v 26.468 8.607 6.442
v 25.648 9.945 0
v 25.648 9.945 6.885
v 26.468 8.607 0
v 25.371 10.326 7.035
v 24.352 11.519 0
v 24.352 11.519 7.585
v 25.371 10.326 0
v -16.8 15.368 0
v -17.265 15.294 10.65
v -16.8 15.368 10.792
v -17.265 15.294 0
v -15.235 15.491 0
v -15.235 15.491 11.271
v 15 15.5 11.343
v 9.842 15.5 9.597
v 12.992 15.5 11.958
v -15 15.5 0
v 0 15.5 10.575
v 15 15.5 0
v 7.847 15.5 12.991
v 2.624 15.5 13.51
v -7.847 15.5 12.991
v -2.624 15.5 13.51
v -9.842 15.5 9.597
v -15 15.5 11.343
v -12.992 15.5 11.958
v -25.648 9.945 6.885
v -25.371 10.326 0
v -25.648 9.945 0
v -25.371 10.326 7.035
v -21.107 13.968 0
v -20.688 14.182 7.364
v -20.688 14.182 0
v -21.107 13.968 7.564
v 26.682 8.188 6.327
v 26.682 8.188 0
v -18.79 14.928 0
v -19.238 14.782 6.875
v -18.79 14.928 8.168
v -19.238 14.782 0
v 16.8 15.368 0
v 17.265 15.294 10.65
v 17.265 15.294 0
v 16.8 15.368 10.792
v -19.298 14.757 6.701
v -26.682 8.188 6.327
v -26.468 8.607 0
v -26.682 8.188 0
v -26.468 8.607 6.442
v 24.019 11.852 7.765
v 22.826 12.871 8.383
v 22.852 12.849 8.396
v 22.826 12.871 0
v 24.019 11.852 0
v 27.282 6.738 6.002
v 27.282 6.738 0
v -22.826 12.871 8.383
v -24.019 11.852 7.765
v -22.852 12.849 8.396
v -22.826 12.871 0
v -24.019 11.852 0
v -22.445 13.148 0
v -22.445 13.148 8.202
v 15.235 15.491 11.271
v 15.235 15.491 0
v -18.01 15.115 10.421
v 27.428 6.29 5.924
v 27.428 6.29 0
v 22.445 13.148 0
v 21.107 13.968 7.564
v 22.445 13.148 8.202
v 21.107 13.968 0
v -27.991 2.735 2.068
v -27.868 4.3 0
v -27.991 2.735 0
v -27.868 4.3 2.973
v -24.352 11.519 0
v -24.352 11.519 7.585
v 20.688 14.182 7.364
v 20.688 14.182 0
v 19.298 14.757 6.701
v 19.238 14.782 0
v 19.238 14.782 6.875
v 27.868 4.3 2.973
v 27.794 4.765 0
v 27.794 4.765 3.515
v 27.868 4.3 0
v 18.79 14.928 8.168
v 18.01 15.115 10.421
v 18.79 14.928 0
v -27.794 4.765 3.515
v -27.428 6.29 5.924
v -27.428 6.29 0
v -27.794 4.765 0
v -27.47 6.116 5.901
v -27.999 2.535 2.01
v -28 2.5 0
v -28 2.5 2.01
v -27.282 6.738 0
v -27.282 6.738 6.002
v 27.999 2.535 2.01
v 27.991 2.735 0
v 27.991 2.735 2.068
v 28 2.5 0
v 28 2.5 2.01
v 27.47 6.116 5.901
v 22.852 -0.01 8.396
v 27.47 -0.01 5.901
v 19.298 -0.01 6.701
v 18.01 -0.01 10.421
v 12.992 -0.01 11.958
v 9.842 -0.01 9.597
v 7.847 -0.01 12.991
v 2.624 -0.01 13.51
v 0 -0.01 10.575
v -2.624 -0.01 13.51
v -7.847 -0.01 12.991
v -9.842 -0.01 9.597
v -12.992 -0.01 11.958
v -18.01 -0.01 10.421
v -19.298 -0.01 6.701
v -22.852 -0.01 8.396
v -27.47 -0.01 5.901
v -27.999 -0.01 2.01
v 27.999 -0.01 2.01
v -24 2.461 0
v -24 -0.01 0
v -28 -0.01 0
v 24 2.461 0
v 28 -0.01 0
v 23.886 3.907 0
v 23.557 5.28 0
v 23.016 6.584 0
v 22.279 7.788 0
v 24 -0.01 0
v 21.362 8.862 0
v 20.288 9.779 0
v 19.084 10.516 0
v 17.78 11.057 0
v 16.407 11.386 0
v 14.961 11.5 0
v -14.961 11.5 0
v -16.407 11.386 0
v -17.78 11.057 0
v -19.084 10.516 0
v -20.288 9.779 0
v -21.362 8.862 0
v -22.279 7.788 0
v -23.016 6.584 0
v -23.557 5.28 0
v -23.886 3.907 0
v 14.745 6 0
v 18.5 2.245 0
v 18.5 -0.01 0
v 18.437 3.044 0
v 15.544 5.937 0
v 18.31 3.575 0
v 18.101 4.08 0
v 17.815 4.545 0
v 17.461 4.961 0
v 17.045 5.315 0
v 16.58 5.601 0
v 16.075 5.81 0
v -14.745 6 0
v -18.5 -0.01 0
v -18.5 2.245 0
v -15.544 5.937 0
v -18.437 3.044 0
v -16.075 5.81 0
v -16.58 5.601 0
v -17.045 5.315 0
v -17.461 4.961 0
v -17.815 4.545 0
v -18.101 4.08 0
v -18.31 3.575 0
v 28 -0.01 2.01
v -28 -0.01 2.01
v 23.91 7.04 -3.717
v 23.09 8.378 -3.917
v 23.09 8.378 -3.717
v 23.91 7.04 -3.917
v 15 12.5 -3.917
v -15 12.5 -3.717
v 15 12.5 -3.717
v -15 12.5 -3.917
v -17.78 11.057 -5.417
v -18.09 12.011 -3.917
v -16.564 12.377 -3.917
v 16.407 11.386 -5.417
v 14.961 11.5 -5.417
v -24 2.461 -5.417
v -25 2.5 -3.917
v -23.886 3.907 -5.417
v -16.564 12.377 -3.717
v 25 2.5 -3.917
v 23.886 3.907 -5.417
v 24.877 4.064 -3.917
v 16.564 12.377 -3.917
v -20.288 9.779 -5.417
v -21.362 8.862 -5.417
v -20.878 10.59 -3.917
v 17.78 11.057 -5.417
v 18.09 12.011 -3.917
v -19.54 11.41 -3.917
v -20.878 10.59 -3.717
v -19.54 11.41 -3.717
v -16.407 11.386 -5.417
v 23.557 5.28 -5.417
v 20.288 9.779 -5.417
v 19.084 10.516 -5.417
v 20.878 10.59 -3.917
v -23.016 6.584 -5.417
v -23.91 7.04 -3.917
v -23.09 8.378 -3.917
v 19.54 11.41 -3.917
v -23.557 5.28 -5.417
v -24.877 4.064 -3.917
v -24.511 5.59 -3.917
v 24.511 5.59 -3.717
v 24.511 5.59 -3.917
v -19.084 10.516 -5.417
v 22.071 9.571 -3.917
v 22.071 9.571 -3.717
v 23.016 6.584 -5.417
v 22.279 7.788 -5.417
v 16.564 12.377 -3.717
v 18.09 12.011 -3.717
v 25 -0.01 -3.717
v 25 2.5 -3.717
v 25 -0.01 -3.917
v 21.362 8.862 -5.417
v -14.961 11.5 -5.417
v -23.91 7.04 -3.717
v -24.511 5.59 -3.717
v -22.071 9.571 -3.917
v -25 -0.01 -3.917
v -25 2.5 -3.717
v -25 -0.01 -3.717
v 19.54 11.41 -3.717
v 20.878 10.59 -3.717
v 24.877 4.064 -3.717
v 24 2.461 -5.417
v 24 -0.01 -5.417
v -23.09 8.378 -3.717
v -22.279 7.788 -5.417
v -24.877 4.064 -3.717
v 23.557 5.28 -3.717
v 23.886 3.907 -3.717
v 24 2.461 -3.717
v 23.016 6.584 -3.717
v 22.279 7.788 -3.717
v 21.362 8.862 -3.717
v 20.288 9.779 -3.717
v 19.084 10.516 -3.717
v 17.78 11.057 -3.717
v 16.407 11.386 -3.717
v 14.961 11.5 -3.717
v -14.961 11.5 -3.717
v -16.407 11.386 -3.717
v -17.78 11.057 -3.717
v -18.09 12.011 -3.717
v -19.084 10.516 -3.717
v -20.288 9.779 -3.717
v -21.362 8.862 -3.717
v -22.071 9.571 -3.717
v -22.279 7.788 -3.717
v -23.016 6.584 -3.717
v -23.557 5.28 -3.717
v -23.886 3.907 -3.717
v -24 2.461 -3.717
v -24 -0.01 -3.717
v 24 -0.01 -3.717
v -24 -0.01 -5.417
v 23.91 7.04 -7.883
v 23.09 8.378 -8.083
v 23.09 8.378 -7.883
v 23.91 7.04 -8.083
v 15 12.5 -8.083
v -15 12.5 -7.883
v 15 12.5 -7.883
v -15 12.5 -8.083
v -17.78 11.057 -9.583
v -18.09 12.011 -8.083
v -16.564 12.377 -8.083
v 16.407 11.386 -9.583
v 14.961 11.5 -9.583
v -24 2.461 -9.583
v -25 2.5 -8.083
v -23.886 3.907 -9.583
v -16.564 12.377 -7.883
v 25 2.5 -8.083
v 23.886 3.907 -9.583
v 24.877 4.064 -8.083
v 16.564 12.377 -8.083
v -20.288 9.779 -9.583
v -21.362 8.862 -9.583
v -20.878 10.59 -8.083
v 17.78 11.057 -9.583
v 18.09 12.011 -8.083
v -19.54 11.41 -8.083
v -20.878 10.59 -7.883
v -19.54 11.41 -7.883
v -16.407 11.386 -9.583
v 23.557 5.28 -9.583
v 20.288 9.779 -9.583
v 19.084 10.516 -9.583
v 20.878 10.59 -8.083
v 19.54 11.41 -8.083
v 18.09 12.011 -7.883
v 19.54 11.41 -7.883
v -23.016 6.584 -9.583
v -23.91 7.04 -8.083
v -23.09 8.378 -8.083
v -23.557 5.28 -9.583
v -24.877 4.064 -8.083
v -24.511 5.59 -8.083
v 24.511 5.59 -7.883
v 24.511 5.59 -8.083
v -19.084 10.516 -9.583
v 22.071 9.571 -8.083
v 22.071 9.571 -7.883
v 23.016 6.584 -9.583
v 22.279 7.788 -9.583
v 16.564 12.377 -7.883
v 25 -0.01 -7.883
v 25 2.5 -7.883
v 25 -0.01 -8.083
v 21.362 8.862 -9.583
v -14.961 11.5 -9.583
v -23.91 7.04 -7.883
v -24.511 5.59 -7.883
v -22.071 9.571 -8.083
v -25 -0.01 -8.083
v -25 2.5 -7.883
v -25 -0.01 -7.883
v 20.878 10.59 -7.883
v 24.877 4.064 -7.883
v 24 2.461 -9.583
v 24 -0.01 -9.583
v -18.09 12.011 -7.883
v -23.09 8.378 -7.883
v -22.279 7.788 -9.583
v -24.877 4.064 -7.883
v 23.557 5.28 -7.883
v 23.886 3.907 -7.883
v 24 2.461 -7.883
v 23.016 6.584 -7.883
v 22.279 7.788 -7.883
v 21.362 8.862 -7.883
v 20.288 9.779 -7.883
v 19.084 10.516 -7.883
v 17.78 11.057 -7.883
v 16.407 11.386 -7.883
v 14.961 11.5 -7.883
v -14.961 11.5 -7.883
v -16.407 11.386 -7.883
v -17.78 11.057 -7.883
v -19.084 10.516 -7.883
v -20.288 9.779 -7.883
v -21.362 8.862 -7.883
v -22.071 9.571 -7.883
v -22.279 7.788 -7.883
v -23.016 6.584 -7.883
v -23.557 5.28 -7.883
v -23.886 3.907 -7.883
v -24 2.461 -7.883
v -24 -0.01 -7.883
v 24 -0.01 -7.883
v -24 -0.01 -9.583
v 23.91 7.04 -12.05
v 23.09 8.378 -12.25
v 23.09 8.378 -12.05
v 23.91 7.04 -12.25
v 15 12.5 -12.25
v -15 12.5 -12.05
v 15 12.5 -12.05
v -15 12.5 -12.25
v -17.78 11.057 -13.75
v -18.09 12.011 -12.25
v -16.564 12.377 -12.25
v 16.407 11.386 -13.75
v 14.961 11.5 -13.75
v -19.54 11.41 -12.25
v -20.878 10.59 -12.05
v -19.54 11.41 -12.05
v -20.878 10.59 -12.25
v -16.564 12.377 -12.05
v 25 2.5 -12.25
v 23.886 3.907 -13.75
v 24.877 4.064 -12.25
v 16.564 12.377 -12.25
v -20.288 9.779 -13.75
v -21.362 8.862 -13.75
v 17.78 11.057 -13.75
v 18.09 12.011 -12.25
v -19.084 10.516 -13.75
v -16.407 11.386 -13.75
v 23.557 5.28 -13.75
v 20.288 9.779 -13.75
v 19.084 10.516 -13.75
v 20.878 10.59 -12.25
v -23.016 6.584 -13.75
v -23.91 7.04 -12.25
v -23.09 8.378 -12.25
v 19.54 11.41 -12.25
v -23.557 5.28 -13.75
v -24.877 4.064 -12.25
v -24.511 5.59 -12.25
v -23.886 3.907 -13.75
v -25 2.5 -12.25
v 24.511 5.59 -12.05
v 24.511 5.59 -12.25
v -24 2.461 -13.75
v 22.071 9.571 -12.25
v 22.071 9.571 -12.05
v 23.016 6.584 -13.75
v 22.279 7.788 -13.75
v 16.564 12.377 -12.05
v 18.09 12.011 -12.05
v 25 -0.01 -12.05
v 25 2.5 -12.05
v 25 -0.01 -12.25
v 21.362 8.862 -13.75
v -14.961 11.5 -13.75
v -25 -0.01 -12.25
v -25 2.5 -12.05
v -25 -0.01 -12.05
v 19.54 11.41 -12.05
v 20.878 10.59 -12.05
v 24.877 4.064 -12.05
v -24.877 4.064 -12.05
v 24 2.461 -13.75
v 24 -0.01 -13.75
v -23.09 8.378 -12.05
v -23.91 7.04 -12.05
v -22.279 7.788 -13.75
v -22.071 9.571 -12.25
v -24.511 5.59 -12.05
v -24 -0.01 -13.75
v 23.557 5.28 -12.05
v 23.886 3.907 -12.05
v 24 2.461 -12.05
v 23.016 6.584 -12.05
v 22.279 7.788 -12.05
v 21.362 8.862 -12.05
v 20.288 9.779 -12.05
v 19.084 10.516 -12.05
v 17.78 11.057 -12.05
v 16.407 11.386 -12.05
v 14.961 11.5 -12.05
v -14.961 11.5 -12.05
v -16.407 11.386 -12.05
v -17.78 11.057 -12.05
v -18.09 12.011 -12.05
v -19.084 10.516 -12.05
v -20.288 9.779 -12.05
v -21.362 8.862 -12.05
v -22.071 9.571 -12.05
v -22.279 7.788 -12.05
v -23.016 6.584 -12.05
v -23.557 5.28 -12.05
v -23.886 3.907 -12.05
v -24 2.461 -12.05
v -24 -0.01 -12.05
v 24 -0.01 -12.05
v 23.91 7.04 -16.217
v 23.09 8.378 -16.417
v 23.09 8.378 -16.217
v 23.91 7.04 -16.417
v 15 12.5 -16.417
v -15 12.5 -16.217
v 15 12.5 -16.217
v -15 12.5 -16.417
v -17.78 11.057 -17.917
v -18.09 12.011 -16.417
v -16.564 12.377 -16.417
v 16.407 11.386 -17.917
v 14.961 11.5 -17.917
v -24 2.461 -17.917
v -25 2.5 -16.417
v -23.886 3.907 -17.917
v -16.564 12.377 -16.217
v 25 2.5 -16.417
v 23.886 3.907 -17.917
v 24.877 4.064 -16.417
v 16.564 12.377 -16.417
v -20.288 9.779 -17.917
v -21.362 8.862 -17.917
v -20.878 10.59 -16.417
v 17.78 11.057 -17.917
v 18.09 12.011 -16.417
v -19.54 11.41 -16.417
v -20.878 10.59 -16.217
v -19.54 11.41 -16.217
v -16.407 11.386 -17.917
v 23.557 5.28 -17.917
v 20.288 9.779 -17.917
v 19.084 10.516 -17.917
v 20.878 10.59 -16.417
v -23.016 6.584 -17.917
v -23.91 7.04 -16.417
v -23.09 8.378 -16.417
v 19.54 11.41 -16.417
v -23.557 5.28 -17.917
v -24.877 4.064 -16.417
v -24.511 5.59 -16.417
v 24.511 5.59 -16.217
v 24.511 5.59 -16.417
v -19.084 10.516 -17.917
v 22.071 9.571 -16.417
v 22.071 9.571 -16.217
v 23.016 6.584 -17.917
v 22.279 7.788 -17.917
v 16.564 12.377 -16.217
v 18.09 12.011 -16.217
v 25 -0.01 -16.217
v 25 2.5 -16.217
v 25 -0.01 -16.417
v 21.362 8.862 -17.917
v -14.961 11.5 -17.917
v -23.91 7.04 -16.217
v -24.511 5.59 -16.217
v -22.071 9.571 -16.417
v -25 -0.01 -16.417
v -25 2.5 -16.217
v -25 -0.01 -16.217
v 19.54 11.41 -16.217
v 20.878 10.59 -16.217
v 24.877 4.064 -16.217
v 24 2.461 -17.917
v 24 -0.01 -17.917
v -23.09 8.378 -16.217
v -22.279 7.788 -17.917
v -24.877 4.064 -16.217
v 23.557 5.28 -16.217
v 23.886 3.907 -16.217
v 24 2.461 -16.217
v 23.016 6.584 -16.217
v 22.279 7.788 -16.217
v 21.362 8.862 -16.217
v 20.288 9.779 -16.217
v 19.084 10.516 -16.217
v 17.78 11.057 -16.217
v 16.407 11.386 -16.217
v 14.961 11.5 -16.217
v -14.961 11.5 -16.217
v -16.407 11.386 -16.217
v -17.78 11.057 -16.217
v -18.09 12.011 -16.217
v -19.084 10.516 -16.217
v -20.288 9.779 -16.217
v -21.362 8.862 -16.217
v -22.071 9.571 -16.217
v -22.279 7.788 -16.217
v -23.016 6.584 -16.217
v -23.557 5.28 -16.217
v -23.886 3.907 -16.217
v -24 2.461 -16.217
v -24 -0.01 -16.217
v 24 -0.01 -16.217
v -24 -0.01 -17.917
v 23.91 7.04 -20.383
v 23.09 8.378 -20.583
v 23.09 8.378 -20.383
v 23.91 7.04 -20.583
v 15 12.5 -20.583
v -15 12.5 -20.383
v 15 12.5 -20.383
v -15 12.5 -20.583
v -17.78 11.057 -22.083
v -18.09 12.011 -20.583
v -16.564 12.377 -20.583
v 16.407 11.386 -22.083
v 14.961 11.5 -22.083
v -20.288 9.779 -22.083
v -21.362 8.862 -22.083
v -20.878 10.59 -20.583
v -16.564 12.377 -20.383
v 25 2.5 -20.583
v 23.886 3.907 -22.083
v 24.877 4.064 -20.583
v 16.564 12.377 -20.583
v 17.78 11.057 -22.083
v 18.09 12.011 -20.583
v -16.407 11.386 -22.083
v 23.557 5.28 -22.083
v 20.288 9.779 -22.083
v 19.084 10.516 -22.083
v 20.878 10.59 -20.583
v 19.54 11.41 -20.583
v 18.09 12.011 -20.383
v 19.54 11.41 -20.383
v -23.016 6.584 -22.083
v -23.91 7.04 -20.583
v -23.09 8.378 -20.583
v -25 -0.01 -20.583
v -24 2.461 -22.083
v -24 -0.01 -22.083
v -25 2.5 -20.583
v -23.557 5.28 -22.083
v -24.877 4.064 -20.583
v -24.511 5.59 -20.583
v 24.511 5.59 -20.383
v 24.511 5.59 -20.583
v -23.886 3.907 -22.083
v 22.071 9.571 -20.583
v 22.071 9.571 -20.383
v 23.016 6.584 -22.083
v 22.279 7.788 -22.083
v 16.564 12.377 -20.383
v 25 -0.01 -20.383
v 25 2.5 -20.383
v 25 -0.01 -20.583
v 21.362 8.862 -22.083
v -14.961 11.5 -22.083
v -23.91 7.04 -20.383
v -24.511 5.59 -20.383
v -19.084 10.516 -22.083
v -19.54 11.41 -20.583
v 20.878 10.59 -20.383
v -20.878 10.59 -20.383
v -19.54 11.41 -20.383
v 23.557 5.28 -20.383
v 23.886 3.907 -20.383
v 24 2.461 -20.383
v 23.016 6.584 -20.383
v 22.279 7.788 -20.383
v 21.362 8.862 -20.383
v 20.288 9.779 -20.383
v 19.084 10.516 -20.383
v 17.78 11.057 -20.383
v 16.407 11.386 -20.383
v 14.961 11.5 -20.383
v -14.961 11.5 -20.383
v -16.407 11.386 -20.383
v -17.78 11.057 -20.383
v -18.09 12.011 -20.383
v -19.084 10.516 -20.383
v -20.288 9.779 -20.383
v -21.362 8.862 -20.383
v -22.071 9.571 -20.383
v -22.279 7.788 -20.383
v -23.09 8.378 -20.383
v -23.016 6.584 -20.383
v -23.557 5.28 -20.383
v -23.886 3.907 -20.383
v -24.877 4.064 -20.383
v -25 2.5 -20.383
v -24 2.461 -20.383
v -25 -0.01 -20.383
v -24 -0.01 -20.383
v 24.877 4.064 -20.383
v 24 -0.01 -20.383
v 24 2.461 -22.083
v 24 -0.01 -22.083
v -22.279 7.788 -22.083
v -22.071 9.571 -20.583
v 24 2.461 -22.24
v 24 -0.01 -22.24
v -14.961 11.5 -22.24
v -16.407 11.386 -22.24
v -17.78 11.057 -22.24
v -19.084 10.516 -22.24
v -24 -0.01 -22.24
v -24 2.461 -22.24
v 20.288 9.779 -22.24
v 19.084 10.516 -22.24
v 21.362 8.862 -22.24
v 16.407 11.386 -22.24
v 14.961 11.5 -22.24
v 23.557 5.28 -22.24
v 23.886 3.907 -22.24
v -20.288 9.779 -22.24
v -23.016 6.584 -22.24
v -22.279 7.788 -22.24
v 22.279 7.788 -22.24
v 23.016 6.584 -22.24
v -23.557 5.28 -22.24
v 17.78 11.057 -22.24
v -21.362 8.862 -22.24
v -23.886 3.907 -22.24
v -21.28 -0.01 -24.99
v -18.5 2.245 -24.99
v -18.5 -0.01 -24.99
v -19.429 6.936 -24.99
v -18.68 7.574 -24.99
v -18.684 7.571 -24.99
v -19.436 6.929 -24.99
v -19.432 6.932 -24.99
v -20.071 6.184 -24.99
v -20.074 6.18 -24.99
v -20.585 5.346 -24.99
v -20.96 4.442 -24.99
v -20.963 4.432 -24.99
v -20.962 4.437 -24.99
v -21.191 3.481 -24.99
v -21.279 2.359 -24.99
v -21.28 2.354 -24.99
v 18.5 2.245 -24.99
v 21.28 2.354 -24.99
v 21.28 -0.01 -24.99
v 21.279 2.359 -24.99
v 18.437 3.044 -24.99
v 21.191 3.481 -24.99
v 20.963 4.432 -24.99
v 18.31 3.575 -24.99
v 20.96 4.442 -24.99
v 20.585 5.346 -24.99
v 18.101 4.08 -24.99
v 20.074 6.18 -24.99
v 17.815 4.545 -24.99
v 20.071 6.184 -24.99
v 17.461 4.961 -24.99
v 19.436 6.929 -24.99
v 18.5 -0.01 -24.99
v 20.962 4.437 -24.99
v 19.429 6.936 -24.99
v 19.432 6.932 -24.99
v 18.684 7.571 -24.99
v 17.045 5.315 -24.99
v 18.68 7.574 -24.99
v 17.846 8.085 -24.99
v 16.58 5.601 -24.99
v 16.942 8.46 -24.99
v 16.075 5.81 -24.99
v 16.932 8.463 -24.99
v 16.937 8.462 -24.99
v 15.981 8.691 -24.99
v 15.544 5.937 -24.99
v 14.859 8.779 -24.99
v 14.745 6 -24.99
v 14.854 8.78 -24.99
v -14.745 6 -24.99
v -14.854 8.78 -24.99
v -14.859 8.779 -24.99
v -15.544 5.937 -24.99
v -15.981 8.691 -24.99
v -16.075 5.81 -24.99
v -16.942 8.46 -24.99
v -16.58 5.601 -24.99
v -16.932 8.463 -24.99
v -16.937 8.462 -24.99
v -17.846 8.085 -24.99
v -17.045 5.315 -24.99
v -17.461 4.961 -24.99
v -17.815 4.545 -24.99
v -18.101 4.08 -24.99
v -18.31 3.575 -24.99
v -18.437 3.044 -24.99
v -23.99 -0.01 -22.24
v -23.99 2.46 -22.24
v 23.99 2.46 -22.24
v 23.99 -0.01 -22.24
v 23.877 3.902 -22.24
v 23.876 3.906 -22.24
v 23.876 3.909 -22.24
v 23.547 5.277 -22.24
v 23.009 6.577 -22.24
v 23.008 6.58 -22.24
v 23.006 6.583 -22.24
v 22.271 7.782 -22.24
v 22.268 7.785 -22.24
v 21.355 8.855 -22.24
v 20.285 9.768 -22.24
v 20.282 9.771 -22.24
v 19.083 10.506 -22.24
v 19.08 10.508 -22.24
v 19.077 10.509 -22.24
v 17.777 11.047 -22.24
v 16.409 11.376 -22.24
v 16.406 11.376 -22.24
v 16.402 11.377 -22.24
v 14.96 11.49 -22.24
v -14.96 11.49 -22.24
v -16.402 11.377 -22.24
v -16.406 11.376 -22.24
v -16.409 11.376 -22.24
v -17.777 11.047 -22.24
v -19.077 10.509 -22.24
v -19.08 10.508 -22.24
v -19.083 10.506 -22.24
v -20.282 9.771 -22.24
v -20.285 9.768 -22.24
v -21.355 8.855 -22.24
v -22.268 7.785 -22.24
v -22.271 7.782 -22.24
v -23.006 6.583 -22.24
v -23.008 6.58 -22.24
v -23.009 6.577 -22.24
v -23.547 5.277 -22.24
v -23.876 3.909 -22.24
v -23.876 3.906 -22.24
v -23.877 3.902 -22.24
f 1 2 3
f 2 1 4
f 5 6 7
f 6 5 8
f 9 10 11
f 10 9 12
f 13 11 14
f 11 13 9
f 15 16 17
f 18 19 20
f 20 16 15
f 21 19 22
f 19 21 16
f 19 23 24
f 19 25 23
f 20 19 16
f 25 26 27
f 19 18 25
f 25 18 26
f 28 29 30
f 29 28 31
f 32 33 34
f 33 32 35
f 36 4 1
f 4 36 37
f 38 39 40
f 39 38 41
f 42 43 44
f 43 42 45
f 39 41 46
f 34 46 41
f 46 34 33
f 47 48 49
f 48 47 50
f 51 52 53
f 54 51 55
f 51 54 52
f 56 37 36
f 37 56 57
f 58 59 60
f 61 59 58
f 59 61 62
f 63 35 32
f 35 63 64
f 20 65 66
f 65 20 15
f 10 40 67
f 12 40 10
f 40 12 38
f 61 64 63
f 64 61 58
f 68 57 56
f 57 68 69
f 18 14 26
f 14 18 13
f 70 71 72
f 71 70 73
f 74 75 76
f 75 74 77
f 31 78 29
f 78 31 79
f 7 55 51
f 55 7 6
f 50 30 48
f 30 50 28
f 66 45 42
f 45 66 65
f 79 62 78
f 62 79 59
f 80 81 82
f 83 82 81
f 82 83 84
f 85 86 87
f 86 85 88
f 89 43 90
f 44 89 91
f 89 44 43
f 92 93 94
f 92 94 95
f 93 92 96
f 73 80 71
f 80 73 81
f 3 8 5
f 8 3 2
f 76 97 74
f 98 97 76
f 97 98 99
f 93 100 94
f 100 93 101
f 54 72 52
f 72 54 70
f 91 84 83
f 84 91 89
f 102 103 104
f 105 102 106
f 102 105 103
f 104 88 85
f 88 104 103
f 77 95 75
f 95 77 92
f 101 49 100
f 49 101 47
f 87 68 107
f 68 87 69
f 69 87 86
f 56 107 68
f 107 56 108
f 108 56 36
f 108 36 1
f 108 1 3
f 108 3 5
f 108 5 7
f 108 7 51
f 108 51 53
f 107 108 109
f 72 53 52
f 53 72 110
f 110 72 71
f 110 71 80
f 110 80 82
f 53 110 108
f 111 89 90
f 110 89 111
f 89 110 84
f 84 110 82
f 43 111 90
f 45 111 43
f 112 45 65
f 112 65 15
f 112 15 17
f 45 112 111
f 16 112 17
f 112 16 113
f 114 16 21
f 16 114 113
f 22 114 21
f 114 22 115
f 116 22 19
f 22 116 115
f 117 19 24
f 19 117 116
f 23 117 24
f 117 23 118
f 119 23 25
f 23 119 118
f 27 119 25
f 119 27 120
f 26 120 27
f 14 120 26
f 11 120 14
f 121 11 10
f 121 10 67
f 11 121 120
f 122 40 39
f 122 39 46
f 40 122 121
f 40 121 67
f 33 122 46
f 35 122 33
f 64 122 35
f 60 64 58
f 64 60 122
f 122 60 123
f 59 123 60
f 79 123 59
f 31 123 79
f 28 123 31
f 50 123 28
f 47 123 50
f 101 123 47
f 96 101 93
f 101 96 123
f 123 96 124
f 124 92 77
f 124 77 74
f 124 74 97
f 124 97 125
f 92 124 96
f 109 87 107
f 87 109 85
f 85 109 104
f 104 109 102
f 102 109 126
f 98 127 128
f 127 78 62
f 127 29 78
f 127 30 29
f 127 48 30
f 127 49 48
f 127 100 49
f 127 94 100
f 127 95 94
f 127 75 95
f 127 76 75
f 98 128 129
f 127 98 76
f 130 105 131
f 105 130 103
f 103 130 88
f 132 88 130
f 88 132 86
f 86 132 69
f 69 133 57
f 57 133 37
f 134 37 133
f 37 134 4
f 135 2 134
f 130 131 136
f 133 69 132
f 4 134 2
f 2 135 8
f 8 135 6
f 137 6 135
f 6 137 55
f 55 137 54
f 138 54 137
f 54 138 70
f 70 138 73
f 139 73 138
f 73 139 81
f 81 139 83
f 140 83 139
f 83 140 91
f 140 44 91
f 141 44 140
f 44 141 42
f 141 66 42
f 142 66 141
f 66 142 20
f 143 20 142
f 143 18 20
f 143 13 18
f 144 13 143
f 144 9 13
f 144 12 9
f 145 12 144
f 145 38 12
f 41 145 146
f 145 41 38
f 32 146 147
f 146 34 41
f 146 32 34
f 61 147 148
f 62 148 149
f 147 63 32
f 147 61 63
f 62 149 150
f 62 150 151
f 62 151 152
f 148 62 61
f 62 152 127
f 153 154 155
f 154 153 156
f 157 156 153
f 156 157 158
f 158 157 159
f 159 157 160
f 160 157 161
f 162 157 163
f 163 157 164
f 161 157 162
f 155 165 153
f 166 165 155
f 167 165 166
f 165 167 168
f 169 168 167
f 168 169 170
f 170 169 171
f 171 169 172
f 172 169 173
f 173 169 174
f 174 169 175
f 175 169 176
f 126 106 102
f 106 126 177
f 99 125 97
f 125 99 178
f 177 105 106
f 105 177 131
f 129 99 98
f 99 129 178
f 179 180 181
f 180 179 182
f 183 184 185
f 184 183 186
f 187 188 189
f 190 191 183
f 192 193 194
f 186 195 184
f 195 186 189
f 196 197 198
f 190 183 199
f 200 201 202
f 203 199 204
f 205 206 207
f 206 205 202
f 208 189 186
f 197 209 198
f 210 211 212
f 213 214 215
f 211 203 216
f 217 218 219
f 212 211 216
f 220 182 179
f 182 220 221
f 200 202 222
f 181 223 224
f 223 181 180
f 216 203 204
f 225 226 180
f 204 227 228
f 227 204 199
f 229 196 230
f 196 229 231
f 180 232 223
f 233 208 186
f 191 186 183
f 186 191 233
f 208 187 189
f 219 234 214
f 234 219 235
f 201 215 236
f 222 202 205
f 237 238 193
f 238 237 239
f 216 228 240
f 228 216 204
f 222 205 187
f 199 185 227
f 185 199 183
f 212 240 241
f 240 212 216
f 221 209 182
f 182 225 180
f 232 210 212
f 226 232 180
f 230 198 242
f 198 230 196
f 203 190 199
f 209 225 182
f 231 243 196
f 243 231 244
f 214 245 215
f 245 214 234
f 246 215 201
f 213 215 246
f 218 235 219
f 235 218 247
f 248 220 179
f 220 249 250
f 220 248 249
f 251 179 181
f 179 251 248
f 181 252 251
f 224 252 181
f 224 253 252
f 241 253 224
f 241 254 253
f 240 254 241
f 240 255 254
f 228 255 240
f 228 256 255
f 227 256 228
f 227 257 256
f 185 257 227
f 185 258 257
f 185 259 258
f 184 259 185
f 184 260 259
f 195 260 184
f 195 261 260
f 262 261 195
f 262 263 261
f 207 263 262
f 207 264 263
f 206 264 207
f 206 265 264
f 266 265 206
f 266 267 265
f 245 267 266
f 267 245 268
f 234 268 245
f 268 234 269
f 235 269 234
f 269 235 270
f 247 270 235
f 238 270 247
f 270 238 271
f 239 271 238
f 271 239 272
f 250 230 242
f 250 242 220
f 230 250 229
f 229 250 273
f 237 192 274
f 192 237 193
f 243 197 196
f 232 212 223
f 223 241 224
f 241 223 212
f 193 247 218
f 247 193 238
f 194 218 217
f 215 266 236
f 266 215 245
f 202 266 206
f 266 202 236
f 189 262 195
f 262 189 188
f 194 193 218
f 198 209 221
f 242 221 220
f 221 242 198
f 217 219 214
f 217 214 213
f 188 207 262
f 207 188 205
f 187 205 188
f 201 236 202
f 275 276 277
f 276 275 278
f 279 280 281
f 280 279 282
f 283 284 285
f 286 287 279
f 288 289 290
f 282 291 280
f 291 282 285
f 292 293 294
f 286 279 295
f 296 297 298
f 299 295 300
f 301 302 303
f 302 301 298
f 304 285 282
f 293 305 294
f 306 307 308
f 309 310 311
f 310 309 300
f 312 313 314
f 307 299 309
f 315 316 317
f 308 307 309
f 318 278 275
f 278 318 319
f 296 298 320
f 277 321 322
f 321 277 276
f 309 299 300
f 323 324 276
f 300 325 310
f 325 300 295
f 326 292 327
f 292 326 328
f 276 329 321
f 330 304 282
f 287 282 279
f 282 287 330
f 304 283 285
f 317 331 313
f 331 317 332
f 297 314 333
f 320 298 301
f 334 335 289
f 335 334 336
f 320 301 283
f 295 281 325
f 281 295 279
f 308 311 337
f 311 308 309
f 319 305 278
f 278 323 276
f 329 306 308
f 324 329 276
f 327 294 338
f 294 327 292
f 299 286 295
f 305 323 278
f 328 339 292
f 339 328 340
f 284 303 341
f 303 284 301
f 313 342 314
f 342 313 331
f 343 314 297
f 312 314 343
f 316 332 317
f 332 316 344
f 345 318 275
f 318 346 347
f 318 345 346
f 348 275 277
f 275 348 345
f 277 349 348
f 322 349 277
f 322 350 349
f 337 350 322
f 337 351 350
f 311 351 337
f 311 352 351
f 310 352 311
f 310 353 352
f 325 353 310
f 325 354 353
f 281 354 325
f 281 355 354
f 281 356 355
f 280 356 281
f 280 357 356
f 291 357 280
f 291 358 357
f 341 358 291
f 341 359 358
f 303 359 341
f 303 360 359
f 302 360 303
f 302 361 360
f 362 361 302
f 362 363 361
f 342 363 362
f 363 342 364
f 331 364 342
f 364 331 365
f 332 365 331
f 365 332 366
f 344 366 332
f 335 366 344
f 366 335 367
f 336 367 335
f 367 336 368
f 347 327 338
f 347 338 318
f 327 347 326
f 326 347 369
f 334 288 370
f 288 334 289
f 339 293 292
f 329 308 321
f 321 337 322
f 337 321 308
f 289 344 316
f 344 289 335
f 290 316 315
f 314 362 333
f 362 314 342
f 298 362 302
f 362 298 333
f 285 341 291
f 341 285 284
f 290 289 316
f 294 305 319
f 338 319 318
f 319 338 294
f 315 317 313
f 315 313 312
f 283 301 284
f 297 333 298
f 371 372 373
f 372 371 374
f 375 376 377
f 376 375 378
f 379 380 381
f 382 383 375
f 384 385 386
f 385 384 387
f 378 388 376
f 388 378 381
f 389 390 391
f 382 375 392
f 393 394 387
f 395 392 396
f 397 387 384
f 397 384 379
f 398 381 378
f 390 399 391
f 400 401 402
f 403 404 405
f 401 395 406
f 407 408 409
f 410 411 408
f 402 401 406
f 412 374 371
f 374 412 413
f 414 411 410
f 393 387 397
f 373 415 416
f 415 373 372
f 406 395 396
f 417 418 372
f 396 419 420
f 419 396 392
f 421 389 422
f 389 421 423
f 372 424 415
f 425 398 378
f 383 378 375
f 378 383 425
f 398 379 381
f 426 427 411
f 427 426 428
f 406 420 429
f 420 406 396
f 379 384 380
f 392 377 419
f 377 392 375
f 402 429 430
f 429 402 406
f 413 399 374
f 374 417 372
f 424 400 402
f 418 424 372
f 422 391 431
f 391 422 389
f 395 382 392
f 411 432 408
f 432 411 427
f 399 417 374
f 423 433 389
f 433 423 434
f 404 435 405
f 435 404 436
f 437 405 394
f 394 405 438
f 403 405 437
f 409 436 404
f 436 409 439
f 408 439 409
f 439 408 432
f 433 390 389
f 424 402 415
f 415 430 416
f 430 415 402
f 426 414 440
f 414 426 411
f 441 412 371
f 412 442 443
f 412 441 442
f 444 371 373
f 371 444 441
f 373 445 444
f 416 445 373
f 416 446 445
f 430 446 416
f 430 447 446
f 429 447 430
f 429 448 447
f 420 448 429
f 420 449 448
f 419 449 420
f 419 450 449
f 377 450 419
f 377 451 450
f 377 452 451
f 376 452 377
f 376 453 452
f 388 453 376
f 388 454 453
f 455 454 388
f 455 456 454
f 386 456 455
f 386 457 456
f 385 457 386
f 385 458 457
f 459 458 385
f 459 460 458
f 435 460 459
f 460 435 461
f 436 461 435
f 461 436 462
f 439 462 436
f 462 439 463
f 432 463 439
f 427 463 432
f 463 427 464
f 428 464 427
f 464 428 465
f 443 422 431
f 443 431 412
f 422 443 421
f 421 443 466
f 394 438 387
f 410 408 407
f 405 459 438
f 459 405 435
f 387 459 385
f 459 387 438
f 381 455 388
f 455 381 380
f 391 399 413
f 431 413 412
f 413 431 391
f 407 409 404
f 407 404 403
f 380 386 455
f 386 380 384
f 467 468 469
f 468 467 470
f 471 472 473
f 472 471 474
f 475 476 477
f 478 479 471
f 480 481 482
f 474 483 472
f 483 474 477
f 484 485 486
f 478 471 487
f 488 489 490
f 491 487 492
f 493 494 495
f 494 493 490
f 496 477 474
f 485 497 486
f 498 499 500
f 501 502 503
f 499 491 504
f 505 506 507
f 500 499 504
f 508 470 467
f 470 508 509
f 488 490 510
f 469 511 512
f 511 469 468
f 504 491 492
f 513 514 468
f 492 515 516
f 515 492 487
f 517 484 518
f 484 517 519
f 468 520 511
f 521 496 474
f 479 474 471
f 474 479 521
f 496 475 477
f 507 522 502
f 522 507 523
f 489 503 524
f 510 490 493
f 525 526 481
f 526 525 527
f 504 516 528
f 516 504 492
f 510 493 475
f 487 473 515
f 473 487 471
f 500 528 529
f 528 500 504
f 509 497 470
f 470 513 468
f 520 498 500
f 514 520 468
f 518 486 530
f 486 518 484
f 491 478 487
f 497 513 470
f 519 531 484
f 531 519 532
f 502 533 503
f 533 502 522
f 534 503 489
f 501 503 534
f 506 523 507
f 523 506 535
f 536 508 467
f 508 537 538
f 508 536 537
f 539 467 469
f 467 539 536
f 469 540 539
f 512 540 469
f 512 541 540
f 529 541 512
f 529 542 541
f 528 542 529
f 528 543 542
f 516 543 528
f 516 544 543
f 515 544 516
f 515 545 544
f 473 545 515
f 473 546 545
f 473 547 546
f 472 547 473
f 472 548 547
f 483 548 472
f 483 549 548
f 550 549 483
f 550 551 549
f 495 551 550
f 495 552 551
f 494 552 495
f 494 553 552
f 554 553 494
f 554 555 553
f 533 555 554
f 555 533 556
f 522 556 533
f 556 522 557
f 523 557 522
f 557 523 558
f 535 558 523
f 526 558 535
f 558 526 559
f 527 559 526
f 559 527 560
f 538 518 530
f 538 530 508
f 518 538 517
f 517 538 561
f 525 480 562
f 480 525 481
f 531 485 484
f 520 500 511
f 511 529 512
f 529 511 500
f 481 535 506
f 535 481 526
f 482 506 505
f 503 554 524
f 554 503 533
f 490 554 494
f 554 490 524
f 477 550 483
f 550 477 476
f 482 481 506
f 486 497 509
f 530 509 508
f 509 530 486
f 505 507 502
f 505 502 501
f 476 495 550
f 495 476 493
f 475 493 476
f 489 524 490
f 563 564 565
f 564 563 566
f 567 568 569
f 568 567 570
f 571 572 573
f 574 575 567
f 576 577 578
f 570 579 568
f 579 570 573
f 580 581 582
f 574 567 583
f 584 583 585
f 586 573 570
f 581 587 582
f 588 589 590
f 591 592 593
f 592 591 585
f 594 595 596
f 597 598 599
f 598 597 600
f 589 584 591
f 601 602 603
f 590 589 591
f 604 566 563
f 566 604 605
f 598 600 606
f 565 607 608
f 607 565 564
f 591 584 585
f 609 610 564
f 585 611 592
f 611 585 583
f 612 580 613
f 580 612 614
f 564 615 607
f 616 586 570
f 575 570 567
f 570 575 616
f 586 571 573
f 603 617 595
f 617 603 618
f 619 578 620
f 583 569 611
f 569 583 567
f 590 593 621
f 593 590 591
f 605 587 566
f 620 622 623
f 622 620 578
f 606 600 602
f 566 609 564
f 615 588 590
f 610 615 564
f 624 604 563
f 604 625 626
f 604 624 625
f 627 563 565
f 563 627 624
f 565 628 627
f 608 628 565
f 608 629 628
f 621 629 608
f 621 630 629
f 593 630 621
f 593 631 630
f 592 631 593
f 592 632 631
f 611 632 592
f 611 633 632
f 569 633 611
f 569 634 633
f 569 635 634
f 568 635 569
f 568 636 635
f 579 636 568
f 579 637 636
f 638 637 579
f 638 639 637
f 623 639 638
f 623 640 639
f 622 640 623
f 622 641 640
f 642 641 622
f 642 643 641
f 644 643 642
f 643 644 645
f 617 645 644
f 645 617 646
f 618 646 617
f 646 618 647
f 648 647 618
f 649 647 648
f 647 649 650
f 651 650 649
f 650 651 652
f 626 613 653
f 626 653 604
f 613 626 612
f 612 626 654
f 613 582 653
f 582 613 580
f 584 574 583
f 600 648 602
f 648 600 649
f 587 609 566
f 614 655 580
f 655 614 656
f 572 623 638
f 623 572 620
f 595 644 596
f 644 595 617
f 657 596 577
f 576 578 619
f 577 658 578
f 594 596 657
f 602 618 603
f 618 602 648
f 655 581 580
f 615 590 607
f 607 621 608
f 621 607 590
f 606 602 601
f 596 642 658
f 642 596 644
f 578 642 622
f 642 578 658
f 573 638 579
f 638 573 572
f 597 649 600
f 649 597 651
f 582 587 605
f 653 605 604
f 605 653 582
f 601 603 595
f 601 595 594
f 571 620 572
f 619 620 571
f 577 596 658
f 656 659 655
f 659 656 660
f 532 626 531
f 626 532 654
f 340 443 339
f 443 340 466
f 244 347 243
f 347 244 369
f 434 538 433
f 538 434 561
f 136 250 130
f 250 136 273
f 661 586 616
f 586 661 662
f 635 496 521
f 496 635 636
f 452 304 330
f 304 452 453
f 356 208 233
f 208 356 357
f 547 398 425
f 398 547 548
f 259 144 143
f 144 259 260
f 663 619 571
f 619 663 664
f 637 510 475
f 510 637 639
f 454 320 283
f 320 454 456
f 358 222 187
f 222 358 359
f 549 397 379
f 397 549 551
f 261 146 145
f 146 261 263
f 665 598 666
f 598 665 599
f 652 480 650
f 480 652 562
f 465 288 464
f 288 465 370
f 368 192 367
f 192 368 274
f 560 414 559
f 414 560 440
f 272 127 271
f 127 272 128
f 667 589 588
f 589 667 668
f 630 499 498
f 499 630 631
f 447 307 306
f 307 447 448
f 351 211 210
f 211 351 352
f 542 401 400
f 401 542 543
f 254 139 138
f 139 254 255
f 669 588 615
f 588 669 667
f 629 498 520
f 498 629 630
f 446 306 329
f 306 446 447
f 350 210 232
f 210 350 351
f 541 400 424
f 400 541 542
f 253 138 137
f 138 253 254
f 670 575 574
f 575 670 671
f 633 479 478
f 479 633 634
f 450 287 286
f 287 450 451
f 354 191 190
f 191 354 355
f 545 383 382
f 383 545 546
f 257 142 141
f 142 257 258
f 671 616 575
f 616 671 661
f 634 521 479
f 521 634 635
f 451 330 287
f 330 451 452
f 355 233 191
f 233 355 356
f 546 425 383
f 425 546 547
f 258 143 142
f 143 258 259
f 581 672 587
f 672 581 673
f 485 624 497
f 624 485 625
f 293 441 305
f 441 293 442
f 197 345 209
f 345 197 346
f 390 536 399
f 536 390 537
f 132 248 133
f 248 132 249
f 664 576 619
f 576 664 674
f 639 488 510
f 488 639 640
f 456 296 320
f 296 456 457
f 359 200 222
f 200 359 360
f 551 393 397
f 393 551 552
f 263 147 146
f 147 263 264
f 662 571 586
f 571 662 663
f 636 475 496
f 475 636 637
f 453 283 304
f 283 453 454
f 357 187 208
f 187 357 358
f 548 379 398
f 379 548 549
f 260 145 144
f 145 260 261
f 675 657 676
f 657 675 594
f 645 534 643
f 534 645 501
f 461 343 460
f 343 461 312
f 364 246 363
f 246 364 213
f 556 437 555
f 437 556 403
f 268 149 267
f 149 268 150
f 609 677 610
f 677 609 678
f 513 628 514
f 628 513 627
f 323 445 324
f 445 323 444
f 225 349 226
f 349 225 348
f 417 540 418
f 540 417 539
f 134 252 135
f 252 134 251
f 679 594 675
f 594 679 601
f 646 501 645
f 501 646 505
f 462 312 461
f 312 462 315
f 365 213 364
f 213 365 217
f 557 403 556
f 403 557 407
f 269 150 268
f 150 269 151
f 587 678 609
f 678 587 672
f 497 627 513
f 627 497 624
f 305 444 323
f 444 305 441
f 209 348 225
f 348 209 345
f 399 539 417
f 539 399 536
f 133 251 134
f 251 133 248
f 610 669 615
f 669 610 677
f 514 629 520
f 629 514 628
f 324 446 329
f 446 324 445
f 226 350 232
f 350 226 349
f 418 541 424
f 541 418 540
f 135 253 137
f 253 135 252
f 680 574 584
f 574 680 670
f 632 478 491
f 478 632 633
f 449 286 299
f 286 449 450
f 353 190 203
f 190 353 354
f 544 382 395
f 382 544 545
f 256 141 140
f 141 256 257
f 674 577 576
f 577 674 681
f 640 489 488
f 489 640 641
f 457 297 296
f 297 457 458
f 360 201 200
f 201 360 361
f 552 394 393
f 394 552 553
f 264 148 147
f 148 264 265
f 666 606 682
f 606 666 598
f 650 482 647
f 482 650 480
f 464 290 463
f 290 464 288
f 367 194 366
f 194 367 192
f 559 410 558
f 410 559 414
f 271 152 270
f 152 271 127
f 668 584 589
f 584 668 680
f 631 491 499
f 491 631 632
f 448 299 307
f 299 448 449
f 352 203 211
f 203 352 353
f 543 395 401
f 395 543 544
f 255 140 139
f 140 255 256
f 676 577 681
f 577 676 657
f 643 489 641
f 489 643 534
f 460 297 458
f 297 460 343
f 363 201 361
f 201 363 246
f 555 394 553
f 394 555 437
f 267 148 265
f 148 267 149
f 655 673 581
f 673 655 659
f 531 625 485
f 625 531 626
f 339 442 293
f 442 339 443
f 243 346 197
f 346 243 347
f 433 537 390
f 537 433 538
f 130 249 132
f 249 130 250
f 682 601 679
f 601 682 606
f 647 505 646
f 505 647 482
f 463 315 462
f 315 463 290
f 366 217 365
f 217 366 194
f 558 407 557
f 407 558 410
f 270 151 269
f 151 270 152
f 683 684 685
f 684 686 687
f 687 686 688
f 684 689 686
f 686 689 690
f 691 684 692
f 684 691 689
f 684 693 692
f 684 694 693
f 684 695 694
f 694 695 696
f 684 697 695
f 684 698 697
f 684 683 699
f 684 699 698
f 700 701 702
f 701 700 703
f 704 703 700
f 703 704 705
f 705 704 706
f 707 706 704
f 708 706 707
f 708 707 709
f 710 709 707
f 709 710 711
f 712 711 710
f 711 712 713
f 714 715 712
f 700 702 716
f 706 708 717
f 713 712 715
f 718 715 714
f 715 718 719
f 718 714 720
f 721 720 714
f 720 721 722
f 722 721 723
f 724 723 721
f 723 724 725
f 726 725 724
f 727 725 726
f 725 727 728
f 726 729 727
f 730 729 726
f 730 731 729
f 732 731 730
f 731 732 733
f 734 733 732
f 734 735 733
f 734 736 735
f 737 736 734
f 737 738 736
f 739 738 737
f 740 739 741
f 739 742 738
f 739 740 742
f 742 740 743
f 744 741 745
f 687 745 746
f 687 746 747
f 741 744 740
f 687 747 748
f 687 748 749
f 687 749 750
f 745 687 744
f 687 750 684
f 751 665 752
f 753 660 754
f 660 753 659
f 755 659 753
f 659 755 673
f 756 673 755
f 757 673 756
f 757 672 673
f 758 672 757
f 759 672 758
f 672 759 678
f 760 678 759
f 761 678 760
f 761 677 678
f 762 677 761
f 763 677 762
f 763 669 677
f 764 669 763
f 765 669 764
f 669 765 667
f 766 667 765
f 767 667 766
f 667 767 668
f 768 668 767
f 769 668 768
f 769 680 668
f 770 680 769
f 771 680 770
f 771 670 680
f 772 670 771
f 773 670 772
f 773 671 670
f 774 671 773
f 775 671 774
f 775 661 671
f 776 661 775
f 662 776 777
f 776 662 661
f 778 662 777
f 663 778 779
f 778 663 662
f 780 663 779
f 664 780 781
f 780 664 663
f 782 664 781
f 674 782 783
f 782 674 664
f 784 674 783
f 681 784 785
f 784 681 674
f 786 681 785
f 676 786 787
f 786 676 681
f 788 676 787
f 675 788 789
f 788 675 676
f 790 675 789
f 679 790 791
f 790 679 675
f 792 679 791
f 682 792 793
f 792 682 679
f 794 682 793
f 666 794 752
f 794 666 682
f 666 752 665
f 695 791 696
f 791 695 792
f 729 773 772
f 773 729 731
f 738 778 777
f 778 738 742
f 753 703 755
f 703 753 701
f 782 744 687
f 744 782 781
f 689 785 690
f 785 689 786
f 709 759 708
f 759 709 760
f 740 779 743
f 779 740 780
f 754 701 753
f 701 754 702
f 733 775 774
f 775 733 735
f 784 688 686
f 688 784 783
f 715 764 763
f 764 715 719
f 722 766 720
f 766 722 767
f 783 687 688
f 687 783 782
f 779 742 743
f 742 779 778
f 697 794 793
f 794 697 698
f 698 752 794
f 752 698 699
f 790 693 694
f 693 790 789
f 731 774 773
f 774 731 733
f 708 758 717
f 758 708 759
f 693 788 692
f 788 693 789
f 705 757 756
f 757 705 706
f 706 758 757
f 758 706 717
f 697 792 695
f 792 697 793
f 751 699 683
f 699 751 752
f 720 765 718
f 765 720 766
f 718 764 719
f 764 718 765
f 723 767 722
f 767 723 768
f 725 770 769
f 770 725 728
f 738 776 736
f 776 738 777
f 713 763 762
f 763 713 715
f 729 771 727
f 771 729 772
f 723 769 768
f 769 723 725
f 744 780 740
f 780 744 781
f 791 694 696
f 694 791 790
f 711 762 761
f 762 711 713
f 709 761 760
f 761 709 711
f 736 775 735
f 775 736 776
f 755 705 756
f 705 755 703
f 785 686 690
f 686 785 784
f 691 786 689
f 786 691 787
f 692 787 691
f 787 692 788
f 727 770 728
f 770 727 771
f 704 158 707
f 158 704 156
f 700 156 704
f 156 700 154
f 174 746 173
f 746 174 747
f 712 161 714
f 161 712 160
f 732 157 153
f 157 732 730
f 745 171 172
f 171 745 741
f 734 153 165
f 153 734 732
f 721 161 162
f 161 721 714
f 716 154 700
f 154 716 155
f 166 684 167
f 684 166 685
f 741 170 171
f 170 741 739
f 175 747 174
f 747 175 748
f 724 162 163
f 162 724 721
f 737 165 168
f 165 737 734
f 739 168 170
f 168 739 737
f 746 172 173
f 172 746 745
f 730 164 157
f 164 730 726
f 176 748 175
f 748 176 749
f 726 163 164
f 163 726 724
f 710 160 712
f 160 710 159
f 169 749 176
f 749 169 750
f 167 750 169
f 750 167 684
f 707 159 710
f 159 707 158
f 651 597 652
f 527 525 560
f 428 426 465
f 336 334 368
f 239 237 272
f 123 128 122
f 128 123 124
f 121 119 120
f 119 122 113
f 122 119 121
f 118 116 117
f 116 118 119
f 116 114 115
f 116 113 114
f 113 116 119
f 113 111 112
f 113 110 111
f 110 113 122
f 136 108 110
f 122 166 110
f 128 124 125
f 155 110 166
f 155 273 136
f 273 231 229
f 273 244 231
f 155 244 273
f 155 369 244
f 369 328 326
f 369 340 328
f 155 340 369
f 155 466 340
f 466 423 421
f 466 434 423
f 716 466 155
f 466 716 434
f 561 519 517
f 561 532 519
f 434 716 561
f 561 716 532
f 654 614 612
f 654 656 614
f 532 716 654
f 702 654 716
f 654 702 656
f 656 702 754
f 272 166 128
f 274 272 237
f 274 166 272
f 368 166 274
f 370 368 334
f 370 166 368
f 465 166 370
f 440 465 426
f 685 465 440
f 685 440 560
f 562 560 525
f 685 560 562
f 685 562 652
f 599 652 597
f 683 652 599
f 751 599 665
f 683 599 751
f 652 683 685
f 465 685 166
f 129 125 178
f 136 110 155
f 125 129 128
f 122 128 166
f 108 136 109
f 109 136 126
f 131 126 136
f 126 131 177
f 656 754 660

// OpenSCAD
/*--------------------------------------------------------*/
/* Ladder foot
/*
/* History:
/* - Created by:
/*   Addie Janssen (November 15, 2020)
/*   - Modified the zig-zag pattern to have a flat top
/*   - Added validation of foot_radius value
/*   - Number of zig-zags is not generated twice anymore
/*
/* - Based on:
/*   Ladder foot factory / Leiterfuß-Fabrik
/*   by Johann_LA (August 03, 2020)
/*   https://www.thingiverse.com/thing:4560403
/*   - Added zig-zag calculations
/*
/* - Which was based on:
/*   Cap that Hole
/*   by Zivbot (December 06, 2016)
/*   https://www.thingiverse.com/thing:1943463
/*--------------------------------------------------------*/


/* [ Production or Validation ] */

// Turn on for validation during preview, TURN OFF FOR PRODUCTION
show_slice = "On"; // [On: On -- to be used for design/validation, Off: Off -- to be used for production]

/* [ Properties of the hole ] */

// Hole shape
hole_shape = "Rectangle"; // [Round, Square, Rectangle]

// HOLE Dimension 1 (if circular = diameter)
hole_dimension1 = 50; // [10:0.1:150]

// HOLE Dimension 2 (only for rectangle shape)
hole_dimension2 = 25; // [10:0.1:150]

// HOLE Corner Radius (for square/rectangle shapes)
hole_radius = 10; // [0:0.1:20]

// HOLE Depth (e.g. for a table, thickness of the board)
hole_depth = 30; // [2:0.1:100]

/* [ Properties of the plug ] */

// PLUG: plug length
plug_length = 25; // [2:0.1:100]

// PLUG: plug clearance inside hole
plug_clearance = 1; // [0:0.1:5]

// PLUG: plug material thickness
plug_thickness = 5.5; // [0.5:0.1:5]

// PLUG: Choose if you like snaps or fins
features = "Fins"; // [Fins: Fins - preferred choice, Snaps: Snaps - might be too instable, None]

// PLUG: Snaps/Fins protrusion of teeth (mm)
feature_length = 1.0; // [0.1:0.1:6]

// PLUG: Snaps/Fins height of teeth (mm)
feature_height = 1.5; // [0.1:0.1:6]

// PLUG FINS: Number of fins
fin_number = 5; // [1:1:6]

// PLUG SNAPS: Determines gaps size between snaps
snap_width_factor = 0.5; // [0.1:0.1:1]

/* [ Properties of the cover / top-end ] */

// COVER: thickness (mm) -- in skew case the minimal thickness
cover_thickness = 4; // [0.5:0.1:15]

// COVER: Overlap around hole
cover_offset = 3; // [0:0.1:30]

// COVER: Edge design
cover_edge = "ZigZag"; // [ZigZag, Chamfer, Round]

// COVER: Edge design ratio 1 (relative size of chamfer/fillet)
cover_edge_ratioV = 0.5; // [0:0.1:1]

// COVER: Edge design ratio 2 (relative size of chamfer/fillet)
cover_edge_ratioH = 0.1; // [0:0.1:1]

// COVER: Foot radius of Ziz-zag surface
foot_radius = 50;

// COVER: Number of Zig-zags
number_of_zigzag = 6;

// COVER: Height of a Zig-zag
height_zigzag = 3;

/* [ Quality settings ] */

// QUALITY: number of polygon facets
$fn = 40;

// QUALITY: steps in fillet cover design
fillet_steps = 6; // [4:1:15]


/* [Hidden] */
clearance = 0.01;
show_slice_ = (show_slice=="On");
snaps = features == "Snaps";
fins = features == "Fins";

/* testing area
hole_shape = "Rectangle"; // [Round, Square, Rectangle]
snap_width_factor = .5; // [0.1:0.1:1]
show_slice = "Off"; // [On, Off]
features = "Fins"; // [Snaps, Fins, None]
fin_number = 3; // [1:1:6]
hole_radius = 1; // [0:0.1:20]
*/

/*****************************************/
// Show hole

larger_dim = ((hole_shape=="Rectangle")?max(hole_dimension1, hole_dimension2) : hole_dimension1) + cover_offset;
smaller_dim = (hole_shape=="Rectangle")?min(hole_dimension1, hole_dimension2) : hole_dimension1;
largest_depth = max(hole_depth, plug_length)+cover_thickness+1;

// can't have corner radius exceed half the facet length
hole_radius_safe = (hole_radius > smaller_dim/2) ? (smaller_dim/2 - clearance) : hole_radius;

// can't have foot radius being smaller than hole dimension 1
foot_radius_safe = (foot_radius < hole_dimension1) ? hole_dimension1 : foot_radius;

// Illustrate the piece needing a cover
if (show_slice_)
%difference() {
    translate([0,0,-hole_depth/2])
    cube([larger_dim*1.5,larger_dim*1.5,hole_depth],center=true);

    translate([0,0,-(hole_depth+clearance)])
    linear_extrude(hole_depth+4*clearance)
    gen_hole_shape(hole_dimension1, hole_dimension2, hole_radius_safe);

    if (show_slice_)
        translate([0,-larger_dim/2, -(largest_depth/2-clearance)])
        cube([larger_dim*2.2, larger_dim*1, largest_depth+clearance*4], center=true);
}

// Generate the cap
difference() {
    generate_cap();

    color("Red")
    if (show_slice_)
        translate([0,-larger_dim/2-0.01, -(largest_depth/2)])
        cube([larger_dim*1.8, larger_dim*1, largest_depth*6], center=true);
}


//********************** FUNCTIONS *****************************

module generate_cap () {

    // calculation for the ladder foot
    height_offset = sqrt(pow(foot_radius_safe,2)-pow((hole_dimension1)/2+cover_offset,2));

    // what is the total angle we have to split into the zigzag?
    half_angle = atan((hole_dimension1/2+cover_offset)/height_offset);

    union() {

        // Generate the zig-zag cap
        if (cover_edge == "ZigZag") {
            linear_extrude((1-cover_edge_ratioV)*cover_thickness + clearance, convexity = 4)
            offset(r=cover_offset)
                gen_hole_shape(hole_dimension1, hole_dimension2, hole_radius_safe);

            points =
            [
              for (i = [-(number_of_zigzag/2):(number_of_zigzag/2)-1])
                for (
                    pt = [
                            [(foot_radius_safe+0)*cos((i/(number_of_zigzag/2))*half_angle),
                            (foot_radius_safe+0)*sin((i/(number_of_zigzag/2))*half_angle)],
                            [
                                (foot_radius_safe+height_zigzag)*cos(((i+0.25)/(number_of_zigzag/2))*half_angle),
                                (foot_radius_safe+height_zigzag)*sin(((i+0.25)/(number_of_zigzag/2))*half_angle)
                            ],
                            [
                                (foot_radius_safe+height_zigzag)*cos(((i+0.75)/(number_of_zigzag/2))*half_angle),
                                (foot_radius_safe+height_zigzag)*sin(((i+0.75)/(number_of_zigzag/2))*half_angle)
                            ]
                        ]
                ) pt,
                [(foot_radius_safe+0)*cos(half_angle), (foot_radius_safe+0)*sin(half_angle)]
            ];

            intersection() {
                translate([0,0,cover_edge_ratioV*cover_thickness])
                linear_extrude(100, convexity = 4)
                offset(r=cover_offset)
                    gen_hole_shape(hole_dimension1, hole_dimension2, hole_radius_safe);

                translate([0,(hole_dimension2/2+cover_offset),-height_offset+(1-cover_edge_ratioV)*cover_thickness])
                rotate([0,-90,90])
                linear_extrude(hole_dimension2+2*cover_offset)polygon(points);
            }
        }

        // Generate cover with corner design
        if (cover_edge == "Chamfer") {

            linear_extrude((1-cover_edge_ratioV)*cover_thickness + clearance, convexity = 4)
            offset(r=cover_offset)
                gen_hole_shape(hole_dimension1, hole_dimension2, hole_radius_safe);

           hull() {  // convex hull
                translate([0,0,(1-cover_edge_ratioV)*cover_thickness])
                for (i = [0,1]) {

                    translate([0,0,i*cover_edge_ratioV*cover_thickness])
                    linear_extrude(0.01)
                    offset(r=cover_offset-i*cover_edge_ratioH*smaller_dim)
                    gen_hole_shape(hole_dimension1, hole_dimension2, hole_radius_safe);
                }
            }
        }
        else if (cover_edge == "Round") {
            linear_extrude((1-cover_edge_ratioV)*cover_thickness + clearance, convexity = 4)
            offset(r=cover_offset)
                gen_hole_shape(hole_dimension1, hole_dimension2, hole_radius_safe);

            hull() { // convex hull
                translate([0,0,(1-cover_edge_ratioV)*cover_thickness])
                for (i = [0:1/fillet_steps:1]) {
                    translate([0,0, sin(i*90)*cover_edge_ratioV*cover_thickness])
                    linear_extrude(0.01)
                    offset(r=cover_offset - (1-cos(i*90))*cover_edge_ratioH*smaller_dim)
                    gen_hole_shape(hole_dimension1, hole_dimension2, hole_radius_safe);
                }
            }
        }

        // Generate plug
        difference() {

            union() {
                translate([0,0,-(plug_length) + clearance])
                linear_extrude(plug_length+clearance, convexity = 4)
                offset(r=-plug_clearance)
                gen_hole_shape(hole_dimension1, hole_dimension2, hole_radius_safe);


                // Generate plug fins
                //translate([0,0,-(hole_depth) + clearance])
                if (fins) {
                    d = plug_length/(fin_number+1);
                    for (i = [1:fin_number]) {
                        translate([0,0,-(d*i + 0.3*d)])
                        hull() {
                            linear_extrude(0.01)
                            offset(r=-plug_clearance)
                            gen_hole_shape(hole_dimension1, hole_dimension2, hole_radius_safe);

                            translate([0,0,feature_height])
                            linear_extrude(0.2)
                            offset(r=feature_length-plug_clearance)
                            gen_hole_shape(hole_dimension1, hole_dimension2, hole_radius_safe);
                        }
                    }
                }

                if (snaps) {
                    translate([0,0,-plug_length])
                    hull() {
                        linear_extrude(0.01)
                        offset(r=-plug_clearance)
                        gen_hole_shape(hole_dimension1, hole_dimension2, hole_radius_safe);

                        translate([0,0,feature_height])
                        linear_extrude(0.2)
                        offset(r=feature_length-plug_clearance)
                        gen_hole_shape(hole_dimension1, hole_dimension2, hole_radius_safe);
                    }
                }
            }

            // remove inner volume of plug
            translate([0,0,-(plug_length) - clearance])
            linear_extrude(plug_length+2*clearance, convexity = 4)
            offset(r=-(plug_clearance+plug_thickness))
            gen_hole_shape(hole_dimension1, hole_dimension2, hole_radius_safe);

            // remove edge chamfer
            if (!snaps)
            translate([0,0,-(plug_length) ])
            difference() {
                linear_extrude(plug_thickness/2 + clearance )
                offset(r=-plug_clearance  + clearance)
                gen_hole_shape(hole_dimension1, hole_dimension2, hole_radius_safe);

                hull() {
                    linear_extrude(0.01)
                    offset(r=-plug_clearance -(plug_thickness/2)  + 2*clearance)
                    gen_hole_shape(hole_dimension1, hole_dimension2, hole_radius_safe);

                    translate([0,0,plug_thickness/2 + 2*clearance ])
                    linear_extrude(0.01)
                    offset(r=-plug_clearance)
                    gen_hole_shape(hole_dimension1, hole_dimension2, hole_radius_safe);
                }
            }

            // remove snap gaps
            if (snaps) {
                if (hole_shape == "Square") {
                    factor = 0.5+snap_width_factor*0.4;
                    rotate([0,0,45])
                    for (i = [1:4]) {
                        rotate([0,0,i*360/4])
                        translate([factor*hole_dimension1/sin(45),0,-(plug_length/2 + clearance)])
                        rotate([0,0,45])
                        cube([hole_dimension1,hole_dimension1,plug_length+4*clearance], center=true);
                    }

                }
                else if (hole_shape == "Round") {
                    factor = 0.48+snap_width_factor*0.3;
                    rotate([0,0,45])
                    for (i = [1:4]) {
                        rotate([0,0,i*360/4])
                        translate([factor*hole_dimension1/sin(45),0,-(plug_length/2 + clearance)])
                        rotate([0,0,45])
                        cube([hole_dimension1,hole_dimension1,plug_length+4*clearance], center=true);
                    }
                }
                else { // Rectangle
                    factor = 0.5+0.4*snap_width_factor;

                    translate([-factor*hole_dimension1,factor*hole_dimension2,-(plug_length/2 + clearance)])
                    cube([hole_dimension1,hole_dimension2,plug_length+4*clearance], center=true);

                    translate([factor*hole_dimension1,factor*hole_dimension2,-(plug_length/2 + clearance)])
                    cube([hole_dimension1,hole_dimension2,plug_length+4*clearance], center=true);

                    translate([-factor*hole_dimension1,-factor*hole_dimension2,-(plug_length/2 + clearance)])
                    cube([hole_dimension1,hole_dimension2,plug_length+4*clearance], center=true);

                    translate([factor*hole_dimension1,-factor*hole_dimension2,-(plug_length/2 + clearance)])
                    cube([hole_dimension1,hole_dimension2,plug_length+4*clearance], center=true);
                }
            }
        }
    }
}

module gen_hole_shape ( d1, d2, r1 ) {
    if (hole_shape == "Round") {
        circle(d=d1);
    }
    else {
        d1b = d1 - 2*r1;
        d2b = ((hole_shape == "Square")?d1:d2) - 2*r1;

        translate([-d1b/2,-d2b/2,0]) {
            if (r1 > 0)
                minkowski() {
                    circle(r1);
                    square([d1b,d2b]);
                }
            else {
                square([d1b,d2b]);
            }
        }
    }
}
